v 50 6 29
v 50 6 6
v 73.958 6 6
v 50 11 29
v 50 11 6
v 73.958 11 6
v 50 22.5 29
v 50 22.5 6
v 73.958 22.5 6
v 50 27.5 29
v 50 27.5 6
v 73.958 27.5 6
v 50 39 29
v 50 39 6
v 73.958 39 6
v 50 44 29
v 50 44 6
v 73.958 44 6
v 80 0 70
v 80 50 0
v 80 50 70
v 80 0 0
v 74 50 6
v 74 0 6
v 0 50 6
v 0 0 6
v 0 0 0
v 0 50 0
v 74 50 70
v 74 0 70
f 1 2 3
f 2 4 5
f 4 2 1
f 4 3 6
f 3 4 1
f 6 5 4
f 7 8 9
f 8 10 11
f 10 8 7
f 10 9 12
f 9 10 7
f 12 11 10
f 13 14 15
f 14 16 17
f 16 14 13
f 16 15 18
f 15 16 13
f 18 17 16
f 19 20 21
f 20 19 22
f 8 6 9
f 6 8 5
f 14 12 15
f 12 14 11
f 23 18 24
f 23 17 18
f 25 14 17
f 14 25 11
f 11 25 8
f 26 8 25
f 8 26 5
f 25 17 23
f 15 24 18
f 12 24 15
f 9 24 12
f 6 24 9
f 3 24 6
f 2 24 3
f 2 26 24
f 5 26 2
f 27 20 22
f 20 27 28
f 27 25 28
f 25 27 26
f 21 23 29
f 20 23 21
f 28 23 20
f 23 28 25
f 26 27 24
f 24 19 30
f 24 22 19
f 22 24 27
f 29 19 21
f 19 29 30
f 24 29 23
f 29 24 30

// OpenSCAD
$fn = 32;

// ----------------------------------------------------------------------
// Rib bracket: 3-gusset L bracket
// ----------------------------------------------------------------------

// --- parameters (mm) ---
base_l = 80;              // foot length, X
base_w = 50;              // foot width, Y
base_t = 6;               // foot thickness
plate_t = 6;              // upright plate thickness
plate_h = 70;             // overall height
gus_l = 24;               // gusset leg along the foot
gus_h = 24;               // gusset height
gus_t = 5;                // gusset thickness
gus_edge = 6;             // gusset margin from the foot edge
n_gus = 3;                // gusset count

gus_pitch = (base_w - 2 * gus_edge - gus_t) / (n_gus - 1);  // gusset pitch

union() {
  cube([base_l, base_w, base_t]);
  translate([base_l - plate_t, 0, base_t - 1])
    cube([plate_t, base_w, plate_h - base_t + 1]);
  for (i = [0 : n_gus - 1])
    translate([base_l - plate_t - gus_l, gus_edge + i * gus_pitch, base_t - 1])
      rotate([-90, 0, 0])
        linear_extrude(height = gus_t)
          polygon(points = [[0, 0], [gus_l + 1, 0], [0, -gus_h]]);
}
